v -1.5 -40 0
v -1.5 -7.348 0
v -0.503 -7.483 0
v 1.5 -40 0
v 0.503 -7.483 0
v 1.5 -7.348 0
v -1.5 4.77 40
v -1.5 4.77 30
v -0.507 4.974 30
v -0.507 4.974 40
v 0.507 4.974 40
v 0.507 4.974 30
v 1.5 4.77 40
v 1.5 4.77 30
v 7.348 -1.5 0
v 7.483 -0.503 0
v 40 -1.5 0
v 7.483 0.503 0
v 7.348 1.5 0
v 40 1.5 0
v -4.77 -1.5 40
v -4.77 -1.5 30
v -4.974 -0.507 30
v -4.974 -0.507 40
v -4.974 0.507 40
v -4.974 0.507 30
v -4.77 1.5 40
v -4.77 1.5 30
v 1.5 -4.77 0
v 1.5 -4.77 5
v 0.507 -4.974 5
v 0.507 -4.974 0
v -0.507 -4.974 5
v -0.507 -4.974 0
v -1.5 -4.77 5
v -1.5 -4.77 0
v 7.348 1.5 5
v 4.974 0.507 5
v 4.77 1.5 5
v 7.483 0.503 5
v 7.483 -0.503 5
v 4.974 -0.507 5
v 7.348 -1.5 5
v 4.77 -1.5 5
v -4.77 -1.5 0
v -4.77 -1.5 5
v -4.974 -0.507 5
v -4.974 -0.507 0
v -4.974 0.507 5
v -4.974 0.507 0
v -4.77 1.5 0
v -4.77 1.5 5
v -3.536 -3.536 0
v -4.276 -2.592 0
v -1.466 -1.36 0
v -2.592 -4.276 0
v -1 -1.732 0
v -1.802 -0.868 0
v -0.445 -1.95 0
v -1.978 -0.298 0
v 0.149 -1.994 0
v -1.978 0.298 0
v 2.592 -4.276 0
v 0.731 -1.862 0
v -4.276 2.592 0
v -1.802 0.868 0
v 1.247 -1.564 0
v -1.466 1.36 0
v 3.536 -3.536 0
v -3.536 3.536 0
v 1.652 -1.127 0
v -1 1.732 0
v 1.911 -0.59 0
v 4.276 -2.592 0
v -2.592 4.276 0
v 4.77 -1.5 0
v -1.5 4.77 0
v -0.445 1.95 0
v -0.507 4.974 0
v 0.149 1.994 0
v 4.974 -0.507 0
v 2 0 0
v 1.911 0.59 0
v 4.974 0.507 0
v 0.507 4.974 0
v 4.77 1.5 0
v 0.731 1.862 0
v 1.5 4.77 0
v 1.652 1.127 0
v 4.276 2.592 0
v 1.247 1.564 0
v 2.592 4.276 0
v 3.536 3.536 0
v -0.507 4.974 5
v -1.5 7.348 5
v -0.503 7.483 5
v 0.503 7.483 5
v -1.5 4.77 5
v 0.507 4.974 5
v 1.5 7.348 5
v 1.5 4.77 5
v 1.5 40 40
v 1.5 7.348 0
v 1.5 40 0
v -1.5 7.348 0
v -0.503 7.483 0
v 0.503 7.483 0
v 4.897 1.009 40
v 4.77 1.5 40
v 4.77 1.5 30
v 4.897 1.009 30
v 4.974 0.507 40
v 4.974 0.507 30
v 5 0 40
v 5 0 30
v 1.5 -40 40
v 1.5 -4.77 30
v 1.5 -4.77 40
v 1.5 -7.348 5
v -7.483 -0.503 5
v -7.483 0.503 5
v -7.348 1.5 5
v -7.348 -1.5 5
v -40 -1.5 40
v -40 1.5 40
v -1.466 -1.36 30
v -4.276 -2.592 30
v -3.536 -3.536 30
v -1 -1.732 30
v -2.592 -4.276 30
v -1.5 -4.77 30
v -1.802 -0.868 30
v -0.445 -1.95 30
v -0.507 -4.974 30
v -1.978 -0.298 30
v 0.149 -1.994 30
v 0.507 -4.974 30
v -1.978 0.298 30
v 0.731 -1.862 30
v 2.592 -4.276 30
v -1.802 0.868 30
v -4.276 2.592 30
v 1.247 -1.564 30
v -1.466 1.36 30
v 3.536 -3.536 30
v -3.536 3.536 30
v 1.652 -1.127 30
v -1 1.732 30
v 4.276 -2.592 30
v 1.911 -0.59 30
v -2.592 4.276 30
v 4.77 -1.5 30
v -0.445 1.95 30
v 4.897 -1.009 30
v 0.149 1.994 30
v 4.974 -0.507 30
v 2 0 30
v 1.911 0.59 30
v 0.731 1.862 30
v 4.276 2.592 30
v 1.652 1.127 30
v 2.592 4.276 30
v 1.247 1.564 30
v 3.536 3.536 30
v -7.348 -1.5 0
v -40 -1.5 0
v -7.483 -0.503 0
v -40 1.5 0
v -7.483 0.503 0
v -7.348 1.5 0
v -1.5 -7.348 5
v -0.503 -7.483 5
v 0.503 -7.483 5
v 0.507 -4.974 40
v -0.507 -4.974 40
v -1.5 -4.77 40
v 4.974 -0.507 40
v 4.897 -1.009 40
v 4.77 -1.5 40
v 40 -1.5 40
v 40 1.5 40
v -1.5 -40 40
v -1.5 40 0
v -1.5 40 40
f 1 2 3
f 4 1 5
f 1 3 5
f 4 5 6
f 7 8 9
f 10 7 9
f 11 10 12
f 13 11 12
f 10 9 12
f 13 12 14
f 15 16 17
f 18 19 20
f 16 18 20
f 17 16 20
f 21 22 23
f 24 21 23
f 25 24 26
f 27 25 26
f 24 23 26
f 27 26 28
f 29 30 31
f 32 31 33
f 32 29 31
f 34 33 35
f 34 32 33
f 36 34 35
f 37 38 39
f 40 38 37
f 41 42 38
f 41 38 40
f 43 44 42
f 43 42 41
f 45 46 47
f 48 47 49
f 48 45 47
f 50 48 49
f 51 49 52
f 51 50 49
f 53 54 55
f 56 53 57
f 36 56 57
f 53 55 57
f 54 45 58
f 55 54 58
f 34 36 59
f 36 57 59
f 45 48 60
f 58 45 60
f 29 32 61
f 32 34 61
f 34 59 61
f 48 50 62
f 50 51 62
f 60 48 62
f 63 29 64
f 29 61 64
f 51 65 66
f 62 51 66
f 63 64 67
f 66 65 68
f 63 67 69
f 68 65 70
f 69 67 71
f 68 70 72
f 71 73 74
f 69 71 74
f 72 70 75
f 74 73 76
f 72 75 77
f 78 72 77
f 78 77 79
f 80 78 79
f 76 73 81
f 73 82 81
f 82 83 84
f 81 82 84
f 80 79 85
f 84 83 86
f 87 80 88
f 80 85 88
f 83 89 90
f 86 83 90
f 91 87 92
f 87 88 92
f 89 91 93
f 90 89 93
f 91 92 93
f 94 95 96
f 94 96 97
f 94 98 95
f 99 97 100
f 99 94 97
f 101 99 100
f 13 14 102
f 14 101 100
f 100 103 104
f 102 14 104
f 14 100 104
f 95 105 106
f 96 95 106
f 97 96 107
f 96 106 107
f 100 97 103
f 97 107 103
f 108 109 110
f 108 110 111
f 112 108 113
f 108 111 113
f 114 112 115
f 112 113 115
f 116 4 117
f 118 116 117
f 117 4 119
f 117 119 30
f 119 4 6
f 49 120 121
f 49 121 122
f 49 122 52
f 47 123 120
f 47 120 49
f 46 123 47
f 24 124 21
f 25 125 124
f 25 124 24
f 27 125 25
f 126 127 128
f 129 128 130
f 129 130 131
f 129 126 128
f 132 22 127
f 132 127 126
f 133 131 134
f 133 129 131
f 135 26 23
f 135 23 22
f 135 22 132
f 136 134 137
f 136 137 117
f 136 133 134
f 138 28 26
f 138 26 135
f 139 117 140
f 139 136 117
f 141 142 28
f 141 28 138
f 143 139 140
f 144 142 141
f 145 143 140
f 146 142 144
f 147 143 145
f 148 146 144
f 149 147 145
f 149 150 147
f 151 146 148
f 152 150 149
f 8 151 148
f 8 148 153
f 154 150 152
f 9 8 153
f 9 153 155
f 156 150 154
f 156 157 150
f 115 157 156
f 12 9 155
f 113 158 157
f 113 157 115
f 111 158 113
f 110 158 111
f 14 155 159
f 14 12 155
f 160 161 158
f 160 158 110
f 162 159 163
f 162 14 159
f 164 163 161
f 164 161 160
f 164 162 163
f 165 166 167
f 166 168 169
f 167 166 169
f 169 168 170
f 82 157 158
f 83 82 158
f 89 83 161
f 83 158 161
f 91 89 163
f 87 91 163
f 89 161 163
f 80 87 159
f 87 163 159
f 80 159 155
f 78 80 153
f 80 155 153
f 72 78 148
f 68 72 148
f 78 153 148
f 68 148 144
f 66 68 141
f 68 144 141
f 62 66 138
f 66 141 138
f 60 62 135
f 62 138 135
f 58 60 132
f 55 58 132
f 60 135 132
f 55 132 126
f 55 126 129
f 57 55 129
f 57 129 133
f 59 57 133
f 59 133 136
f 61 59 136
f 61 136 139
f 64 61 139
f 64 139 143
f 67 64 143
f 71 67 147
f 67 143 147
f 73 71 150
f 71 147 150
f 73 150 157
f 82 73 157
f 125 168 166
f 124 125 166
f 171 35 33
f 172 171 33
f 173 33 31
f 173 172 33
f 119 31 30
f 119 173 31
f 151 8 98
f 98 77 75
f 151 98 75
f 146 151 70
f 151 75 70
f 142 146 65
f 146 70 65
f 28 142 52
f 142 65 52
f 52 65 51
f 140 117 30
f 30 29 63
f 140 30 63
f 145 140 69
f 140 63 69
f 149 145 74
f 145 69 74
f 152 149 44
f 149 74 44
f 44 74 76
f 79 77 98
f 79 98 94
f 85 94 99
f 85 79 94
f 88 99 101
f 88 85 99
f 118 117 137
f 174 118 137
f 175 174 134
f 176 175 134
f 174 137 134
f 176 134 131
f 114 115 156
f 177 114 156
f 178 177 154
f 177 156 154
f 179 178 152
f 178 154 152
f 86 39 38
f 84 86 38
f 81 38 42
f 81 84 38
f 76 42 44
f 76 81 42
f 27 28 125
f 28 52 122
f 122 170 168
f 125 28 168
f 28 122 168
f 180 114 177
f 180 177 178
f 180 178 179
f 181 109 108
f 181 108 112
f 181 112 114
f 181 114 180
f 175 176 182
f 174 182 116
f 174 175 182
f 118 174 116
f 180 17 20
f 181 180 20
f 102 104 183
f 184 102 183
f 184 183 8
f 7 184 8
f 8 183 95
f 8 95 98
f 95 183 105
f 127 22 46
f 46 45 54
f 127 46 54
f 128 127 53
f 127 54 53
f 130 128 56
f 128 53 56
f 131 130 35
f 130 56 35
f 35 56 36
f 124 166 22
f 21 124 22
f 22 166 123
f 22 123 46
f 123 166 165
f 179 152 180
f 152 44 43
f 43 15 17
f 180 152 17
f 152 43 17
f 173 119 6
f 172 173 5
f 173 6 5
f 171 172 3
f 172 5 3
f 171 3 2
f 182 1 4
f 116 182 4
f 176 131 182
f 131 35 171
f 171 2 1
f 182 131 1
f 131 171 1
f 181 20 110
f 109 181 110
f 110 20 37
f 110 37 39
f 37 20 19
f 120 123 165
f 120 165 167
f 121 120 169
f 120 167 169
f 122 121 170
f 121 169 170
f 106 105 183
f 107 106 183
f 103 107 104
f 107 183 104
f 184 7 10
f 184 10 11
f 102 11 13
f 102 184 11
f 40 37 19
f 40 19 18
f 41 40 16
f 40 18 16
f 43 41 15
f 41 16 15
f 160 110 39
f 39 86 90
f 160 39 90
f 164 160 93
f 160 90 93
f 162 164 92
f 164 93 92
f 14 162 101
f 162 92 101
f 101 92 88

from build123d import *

# Parameters (mm, degrees)
F1_DEPTH = 40
F0_W     = 3
F0_H     = 3
F2_DEPTH = 30
F3_R     = 2
F4_DEPTH = 30
F5_R     = 7.5
F5_R_2   = 5
F6_DEPTH = 5


with BuildPart() as f1:
    # F0 (on Top) → F1 (new body)
    with BuildSketch(Plane.XY):
        with BuildLine():
            ThreePointArc((-4.7696960071, -1.5), (-5, 0), (-4.7696960071, 1.5))
            Line((-4.7696960071, 1.5), (-40, 1.5))
            Line((-40, 1.5), (-40, -1.5))
            Line((-40, -1.5), (-4.7696960071, -1.5))
        make_face()
    extrude(amount=F1_DEPTH)



with BuildPart() as f1b:
    # F0 (on Top) → F1, piece 2 (new body)
    with BuildSketch(Plane.XY):
        with BuildLine():
            ThreePointArc((-1.5, 4.7696960071), (0, 5), (1.5, 4.7696960071))
            Line((1.5, 4.7696960071), (1.5, 40))
            Line((1.5, 40), (-1.5, 40))
            Line((-1.5, 40), (-1.5, 4.7696960071))
        make_face()
    extrude(amount=F1_DEPTH)


with BuildPart() as f1c:
    # F0 (on Top) → F1, piece 3 (new body)
    with BuildSketch(Plane.XY):
        with BuildLine():
            ThreePointArc((4.7696960071, 1.5), (4.9420886291, 0.7587884964), (5, 0))
            ThreePointArc((5, 0), (4.9420886291, -0.7587884964), (4.7696960071, -1.5))
            Line((4.7696960071, -1.5), (40, -1.5))
            Line((40, -1.5), (40, 1.5))
            Line((40, 1.5), (4.7696960071, 1.5))
        make_face()
    extrude(amount=F1_DEPTH)


with BuildPart() as f1d:
    # F0 (on Top) → F1, piece 4 (new body)
    with BuildSketch(Plane.XY):
        with BuildLine():
            Line((1.5, -40), (1.5, -4.7696960071))
            ThreePointArc((1.5, -4.7696960071), (0, -5), (-1.5, -4.7696960071))
            Line((-1.5, -4.7696960071), (-1.5, -40))
            Line((-1.5, -40), (1.5, -40))
        make_face()
    extrude(amount=F1_DEPTH)


with BuildPart() as f1_1:
    add(f1.part)

    add(f1b.part)  # F2 merges F1b

    add(f1c.part)  # F2 merges F1c

    add(f1d.part)  # F2 merges F1d
    # F0 (on Top) → F2 (join)
    with BuildSketch(Plane.XY):
        with BuildLine():
            Line((-1.5, 1.5), (-1.5, 4.7696960071))
            ThreePointArc((-1.5, 4.7696960071), (-3.5355339059, 3.5355339059), (-4.7696960071, 1.5))
            Line((-4.7696960071, 1.5), (-1.5, 1.5))
        make_face()
        with BuildLine():
            Line((1.5, 1.5), (4.7696960071, 1.5))
            ThreePointArc((4.7696960071, 1.5), (3.5355339059, 3.5355339059), (1.5, 4.7696960071))
            Line((1.5, 4.7696960071), (1.5, 1.5))
        make_face()
        with BuildLine():
            ThreePointArc((1.5, -4.7696960071), (3.5355339059, -3.5355339059), (4.7696960071, -1.5))
            Line((4.7696960071, -1.5), (1.5, -1.5))
            Line((1.5, -1.5), (1.5, -4.7696960071))
        make_face()
        with BuildLine():
            ThreePointArc((-4.7696960071, -1.5), (-3.5355339059, -3.5355339059), (-1.5, -4.7696960071))
            Line((-1.5, -4.7696960071), (-1.5, -1.5))
            Line((-1.5, -1.5), (-4.7696960071, -1.5))
        make_face()
        with BuildLine():
            ThreePointArc((4.7696960071, -1.5), (4.9420886291, -0.7587884964), (5, 0))
            ThreePointArc((5, 0), (4.9420886291, 0.7587884964), (4.7696960071, 1.5))
            Line((4.7696960071, 1.5), (1.5, 1.5))
            Line((1.5, 1.5), (1.5, -1.5))
            Line((1.5, -1.5), (4.7696960071, -1.5))
        make_face()
        with BuildLine():
            Line((1.5, 1.5), (1.5, 4.7696960071))
            ThreePointArc((1.5, 4.7696960071), (0, 5), (-1.5, 4.7696960071))
            Line((-1.5, 4.7696960071), (-1.5, 1.5))
            Line((-1.5, 1.5), (1.5, 1.5))
        make_face()
        with BuildLine():
            Line((-1.5, -1.5), (-1.5, 1.5))
            Line((-1.5, 1.5), (-4.7696960071, 1.5))
            ThreePointArc((-4.7696960071, 1.5), (-5, 0), (-4.7696960071, -1.5))
            Line((-4.7696960071, -1.5), (-1.5, -1.5))
        make_face()
        Rectangle(F0_W, F0_H)
        with BuildLine():
            ThreePointArc((-1.5, -4.7696960071), (0, -5), (1.5, -4.7696960071))
            Line((1.5, -4.7696960071), (1.5, -1.5))
            Line((1.5, -1.5), (-1.5, -1.5))
            Line((-1.5, -1.5), (-1.5, -4.7696960071))
        make_face()
    extrude(amount=F2_DEPTH)

    # F3 (on face) → F4 (cut)
    with BuildSketch(Plane.XY.offset(30)):
        Circle(F3_R)
    extrude(amount=-F4_DEPTH, mode=Mode.SUBTRACT)

    # F5 (on face) → F6 (cut)
    with BuildSketch(Plane(origin=(0, 0, 0), x_dir=(1, 0, 0), z_dir=(0, 0, -1))):
        Circle(F5_R)
        Circle(F5_R_2, mode=Mode.SUBTRACT)
    extrude(amount=-F6_DEPTH, mode=Mode.SUBTRACT)


solid = f1_1.part
